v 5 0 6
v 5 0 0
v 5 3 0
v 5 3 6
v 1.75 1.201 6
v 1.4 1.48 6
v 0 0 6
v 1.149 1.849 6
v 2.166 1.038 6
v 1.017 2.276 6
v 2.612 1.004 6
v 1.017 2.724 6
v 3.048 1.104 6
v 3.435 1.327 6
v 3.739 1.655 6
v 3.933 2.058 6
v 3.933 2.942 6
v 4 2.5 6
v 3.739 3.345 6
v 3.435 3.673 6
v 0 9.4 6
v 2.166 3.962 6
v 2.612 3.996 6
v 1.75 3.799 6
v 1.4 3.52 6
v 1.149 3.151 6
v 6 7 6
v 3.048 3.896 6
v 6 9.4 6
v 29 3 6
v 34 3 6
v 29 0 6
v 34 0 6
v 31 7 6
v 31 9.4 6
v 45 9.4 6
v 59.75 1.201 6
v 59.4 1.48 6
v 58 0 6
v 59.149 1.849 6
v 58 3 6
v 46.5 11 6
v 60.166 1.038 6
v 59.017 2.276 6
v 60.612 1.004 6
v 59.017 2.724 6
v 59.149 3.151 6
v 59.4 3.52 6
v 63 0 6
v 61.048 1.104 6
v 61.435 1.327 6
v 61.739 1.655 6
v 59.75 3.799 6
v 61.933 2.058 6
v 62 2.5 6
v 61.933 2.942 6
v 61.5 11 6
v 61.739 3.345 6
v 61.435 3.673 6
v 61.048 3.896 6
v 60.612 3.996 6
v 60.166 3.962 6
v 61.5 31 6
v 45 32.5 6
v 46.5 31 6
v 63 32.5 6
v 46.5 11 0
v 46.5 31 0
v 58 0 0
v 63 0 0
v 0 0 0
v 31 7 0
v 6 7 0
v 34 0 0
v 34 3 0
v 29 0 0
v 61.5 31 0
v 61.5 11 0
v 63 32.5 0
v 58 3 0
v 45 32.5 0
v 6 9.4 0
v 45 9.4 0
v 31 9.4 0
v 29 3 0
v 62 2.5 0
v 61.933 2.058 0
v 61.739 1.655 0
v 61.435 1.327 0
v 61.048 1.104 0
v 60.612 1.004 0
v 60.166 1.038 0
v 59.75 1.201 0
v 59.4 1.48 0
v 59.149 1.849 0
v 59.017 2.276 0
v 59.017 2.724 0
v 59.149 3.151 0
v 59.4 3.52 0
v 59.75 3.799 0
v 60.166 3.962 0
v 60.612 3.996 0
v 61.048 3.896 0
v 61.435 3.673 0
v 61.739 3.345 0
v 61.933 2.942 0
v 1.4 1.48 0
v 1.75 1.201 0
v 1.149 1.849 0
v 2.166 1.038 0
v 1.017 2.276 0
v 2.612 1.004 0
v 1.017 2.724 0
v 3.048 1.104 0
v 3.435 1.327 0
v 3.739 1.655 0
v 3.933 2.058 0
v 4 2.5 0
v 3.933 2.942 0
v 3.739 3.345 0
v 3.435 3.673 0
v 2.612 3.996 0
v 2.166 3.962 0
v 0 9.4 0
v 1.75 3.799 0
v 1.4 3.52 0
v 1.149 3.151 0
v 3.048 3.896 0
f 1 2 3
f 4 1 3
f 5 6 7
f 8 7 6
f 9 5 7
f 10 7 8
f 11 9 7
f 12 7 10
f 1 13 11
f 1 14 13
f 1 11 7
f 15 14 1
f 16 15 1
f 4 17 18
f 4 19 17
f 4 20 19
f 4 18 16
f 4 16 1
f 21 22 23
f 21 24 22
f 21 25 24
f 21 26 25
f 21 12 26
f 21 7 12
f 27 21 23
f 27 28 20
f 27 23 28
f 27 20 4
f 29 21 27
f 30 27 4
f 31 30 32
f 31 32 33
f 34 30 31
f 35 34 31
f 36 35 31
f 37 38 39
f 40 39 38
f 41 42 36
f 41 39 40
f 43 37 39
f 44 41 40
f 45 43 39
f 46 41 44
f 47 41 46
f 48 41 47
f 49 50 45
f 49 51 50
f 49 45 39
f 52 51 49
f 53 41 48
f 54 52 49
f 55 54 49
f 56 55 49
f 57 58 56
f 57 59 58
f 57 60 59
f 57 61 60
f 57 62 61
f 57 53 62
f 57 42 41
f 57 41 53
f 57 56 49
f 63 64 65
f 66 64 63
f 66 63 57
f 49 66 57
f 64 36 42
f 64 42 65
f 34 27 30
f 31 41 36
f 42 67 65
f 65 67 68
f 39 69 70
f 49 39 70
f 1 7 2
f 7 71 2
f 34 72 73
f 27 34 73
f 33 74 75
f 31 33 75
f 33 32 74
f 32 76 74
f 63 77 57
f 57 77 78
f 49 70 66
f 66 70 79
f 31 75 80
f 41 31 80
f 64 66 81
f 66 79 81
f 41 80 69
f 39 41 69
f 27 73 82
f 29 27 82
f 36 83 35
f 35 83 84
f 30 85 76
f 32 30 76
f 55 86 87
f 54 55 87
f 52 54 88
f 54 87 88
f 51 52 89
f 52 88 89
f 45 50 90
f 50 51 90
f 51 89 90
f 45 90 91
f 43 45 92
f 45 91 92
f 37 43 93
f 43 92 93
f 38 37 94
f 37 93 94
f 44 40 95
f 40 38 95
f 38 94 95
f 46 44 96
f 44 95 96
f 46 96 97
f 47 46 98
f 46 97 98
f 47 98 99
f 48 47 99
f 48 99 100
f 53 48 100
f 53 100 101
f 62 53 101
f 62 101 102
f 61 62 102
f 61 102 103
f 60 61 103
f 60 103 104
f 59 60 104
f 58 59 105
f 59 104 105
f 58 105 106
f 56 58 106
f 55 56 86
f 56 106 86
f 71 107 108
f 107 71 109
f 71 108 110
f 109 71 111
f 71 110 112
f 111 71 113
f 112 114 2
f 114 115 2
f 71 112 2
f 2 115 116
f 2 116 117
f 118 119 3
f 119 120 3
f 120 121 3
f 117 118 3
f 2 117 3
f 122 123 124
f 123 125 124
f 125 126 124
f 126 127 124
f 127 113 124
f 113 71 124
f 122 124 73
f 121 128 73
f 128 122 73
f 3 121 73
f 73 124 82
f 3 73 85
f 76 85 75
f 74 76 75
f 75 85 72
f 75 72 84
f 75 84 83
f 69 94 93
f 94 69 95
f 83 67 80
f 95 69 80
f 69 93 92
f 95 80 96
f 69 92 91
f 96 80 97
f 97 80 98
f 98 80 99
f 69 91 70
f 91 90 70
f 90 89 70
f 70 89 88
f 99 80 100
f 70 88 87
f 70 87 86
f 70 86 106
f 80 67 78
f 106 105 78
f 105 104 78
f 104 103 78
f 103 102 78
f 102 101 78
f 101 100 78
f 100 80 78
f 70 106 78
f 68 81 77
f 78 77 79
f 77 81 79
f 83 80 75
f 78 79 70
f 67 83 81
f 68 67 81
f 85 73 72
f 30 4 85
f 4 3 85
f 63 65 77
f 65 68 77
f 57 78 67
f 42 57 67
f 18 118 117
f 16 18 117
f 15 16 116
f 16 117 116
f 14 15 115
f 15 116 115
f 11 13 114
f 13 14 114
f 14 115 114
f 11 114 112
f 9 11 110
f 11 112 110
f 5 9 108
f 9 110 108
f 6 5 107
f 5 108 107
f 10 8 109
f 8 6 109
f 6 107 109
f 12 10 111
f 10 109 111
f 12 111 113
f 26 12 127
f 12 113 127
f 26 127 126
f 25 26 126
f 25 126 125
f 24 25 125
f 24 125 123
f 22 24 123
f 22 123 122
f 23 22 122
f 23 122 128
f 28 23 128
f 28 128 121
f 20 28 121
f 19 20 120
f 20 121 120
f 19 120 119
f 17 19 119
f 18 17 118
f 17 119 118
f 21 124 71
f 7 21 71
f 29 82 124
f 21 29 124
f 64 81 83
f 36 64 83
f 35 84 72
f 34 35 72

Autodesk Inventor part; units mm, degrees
ref_plane "YZ Plane" through (0, 0, 0) normal (1, 0, 0) x (0, 1, 0)
ref_plane "XZ Plane" through (0, 0, 0) normal (0, 1, 0) x (-1, 0, 0)
ref_plane "XY Plane" through (0, 0, 0) normal (0, 0, 1) x (1, 0, 0)
sketch "Sketch1" plane through (0, 0, 0) normal (0, 0, 1) x (1, 0, 0)
  line L0 (46.5, 31) -> (61.5, 31)
  line L1 (61.5, 31) -> (61.5, 11)
  line L2 (61.5, 11) -> (46.5, 11)
  line L3 (46.5, 11) -> (46.5, 31)
  circle A0 centre (60.5, 2.5) radius 1.5
  circle A1 centre (2.5, 2.5) radius 1.5
  line L4 (0, 9.4) -> (0, 0)
  line L5 (0, 0) -> (5, 0)
  line L6 (5, 0) -> (5, 3)
  line L7 (5, 3) -> (29, 3)
  line L8 (29, 3) -> (29, 0)
  line L9 (29, 0) -> (34, 0)
  line L10 (34, 0) -> (34, 3)
  line L11 (34, 3) -> (58, 3)
  line L12 (58, 3) -> (58, 0)
  line L13 (58, 0) -> (63, 0)
  line L14 (63, 0) -> (63, 32.5)
  line L15 (63, 32.5) -> (45, 32.5)
  line L16 (45, 32.5) -> (45, 9.4)
  line L17 (45, 9.4) -> (31, 9.4)
  line L18 (31, 9.4) -> (31, 7)
  line L19 (31, 7) -> (6, 7)
  line L20 (6, 7) -> (6, 9.4)
  line L21 (6, 9.4) -> (0, 9.4)
extrude "Extrusion1" add sketch "Sketch1" along normal blind 6
properties part number "yCarMid_d"
